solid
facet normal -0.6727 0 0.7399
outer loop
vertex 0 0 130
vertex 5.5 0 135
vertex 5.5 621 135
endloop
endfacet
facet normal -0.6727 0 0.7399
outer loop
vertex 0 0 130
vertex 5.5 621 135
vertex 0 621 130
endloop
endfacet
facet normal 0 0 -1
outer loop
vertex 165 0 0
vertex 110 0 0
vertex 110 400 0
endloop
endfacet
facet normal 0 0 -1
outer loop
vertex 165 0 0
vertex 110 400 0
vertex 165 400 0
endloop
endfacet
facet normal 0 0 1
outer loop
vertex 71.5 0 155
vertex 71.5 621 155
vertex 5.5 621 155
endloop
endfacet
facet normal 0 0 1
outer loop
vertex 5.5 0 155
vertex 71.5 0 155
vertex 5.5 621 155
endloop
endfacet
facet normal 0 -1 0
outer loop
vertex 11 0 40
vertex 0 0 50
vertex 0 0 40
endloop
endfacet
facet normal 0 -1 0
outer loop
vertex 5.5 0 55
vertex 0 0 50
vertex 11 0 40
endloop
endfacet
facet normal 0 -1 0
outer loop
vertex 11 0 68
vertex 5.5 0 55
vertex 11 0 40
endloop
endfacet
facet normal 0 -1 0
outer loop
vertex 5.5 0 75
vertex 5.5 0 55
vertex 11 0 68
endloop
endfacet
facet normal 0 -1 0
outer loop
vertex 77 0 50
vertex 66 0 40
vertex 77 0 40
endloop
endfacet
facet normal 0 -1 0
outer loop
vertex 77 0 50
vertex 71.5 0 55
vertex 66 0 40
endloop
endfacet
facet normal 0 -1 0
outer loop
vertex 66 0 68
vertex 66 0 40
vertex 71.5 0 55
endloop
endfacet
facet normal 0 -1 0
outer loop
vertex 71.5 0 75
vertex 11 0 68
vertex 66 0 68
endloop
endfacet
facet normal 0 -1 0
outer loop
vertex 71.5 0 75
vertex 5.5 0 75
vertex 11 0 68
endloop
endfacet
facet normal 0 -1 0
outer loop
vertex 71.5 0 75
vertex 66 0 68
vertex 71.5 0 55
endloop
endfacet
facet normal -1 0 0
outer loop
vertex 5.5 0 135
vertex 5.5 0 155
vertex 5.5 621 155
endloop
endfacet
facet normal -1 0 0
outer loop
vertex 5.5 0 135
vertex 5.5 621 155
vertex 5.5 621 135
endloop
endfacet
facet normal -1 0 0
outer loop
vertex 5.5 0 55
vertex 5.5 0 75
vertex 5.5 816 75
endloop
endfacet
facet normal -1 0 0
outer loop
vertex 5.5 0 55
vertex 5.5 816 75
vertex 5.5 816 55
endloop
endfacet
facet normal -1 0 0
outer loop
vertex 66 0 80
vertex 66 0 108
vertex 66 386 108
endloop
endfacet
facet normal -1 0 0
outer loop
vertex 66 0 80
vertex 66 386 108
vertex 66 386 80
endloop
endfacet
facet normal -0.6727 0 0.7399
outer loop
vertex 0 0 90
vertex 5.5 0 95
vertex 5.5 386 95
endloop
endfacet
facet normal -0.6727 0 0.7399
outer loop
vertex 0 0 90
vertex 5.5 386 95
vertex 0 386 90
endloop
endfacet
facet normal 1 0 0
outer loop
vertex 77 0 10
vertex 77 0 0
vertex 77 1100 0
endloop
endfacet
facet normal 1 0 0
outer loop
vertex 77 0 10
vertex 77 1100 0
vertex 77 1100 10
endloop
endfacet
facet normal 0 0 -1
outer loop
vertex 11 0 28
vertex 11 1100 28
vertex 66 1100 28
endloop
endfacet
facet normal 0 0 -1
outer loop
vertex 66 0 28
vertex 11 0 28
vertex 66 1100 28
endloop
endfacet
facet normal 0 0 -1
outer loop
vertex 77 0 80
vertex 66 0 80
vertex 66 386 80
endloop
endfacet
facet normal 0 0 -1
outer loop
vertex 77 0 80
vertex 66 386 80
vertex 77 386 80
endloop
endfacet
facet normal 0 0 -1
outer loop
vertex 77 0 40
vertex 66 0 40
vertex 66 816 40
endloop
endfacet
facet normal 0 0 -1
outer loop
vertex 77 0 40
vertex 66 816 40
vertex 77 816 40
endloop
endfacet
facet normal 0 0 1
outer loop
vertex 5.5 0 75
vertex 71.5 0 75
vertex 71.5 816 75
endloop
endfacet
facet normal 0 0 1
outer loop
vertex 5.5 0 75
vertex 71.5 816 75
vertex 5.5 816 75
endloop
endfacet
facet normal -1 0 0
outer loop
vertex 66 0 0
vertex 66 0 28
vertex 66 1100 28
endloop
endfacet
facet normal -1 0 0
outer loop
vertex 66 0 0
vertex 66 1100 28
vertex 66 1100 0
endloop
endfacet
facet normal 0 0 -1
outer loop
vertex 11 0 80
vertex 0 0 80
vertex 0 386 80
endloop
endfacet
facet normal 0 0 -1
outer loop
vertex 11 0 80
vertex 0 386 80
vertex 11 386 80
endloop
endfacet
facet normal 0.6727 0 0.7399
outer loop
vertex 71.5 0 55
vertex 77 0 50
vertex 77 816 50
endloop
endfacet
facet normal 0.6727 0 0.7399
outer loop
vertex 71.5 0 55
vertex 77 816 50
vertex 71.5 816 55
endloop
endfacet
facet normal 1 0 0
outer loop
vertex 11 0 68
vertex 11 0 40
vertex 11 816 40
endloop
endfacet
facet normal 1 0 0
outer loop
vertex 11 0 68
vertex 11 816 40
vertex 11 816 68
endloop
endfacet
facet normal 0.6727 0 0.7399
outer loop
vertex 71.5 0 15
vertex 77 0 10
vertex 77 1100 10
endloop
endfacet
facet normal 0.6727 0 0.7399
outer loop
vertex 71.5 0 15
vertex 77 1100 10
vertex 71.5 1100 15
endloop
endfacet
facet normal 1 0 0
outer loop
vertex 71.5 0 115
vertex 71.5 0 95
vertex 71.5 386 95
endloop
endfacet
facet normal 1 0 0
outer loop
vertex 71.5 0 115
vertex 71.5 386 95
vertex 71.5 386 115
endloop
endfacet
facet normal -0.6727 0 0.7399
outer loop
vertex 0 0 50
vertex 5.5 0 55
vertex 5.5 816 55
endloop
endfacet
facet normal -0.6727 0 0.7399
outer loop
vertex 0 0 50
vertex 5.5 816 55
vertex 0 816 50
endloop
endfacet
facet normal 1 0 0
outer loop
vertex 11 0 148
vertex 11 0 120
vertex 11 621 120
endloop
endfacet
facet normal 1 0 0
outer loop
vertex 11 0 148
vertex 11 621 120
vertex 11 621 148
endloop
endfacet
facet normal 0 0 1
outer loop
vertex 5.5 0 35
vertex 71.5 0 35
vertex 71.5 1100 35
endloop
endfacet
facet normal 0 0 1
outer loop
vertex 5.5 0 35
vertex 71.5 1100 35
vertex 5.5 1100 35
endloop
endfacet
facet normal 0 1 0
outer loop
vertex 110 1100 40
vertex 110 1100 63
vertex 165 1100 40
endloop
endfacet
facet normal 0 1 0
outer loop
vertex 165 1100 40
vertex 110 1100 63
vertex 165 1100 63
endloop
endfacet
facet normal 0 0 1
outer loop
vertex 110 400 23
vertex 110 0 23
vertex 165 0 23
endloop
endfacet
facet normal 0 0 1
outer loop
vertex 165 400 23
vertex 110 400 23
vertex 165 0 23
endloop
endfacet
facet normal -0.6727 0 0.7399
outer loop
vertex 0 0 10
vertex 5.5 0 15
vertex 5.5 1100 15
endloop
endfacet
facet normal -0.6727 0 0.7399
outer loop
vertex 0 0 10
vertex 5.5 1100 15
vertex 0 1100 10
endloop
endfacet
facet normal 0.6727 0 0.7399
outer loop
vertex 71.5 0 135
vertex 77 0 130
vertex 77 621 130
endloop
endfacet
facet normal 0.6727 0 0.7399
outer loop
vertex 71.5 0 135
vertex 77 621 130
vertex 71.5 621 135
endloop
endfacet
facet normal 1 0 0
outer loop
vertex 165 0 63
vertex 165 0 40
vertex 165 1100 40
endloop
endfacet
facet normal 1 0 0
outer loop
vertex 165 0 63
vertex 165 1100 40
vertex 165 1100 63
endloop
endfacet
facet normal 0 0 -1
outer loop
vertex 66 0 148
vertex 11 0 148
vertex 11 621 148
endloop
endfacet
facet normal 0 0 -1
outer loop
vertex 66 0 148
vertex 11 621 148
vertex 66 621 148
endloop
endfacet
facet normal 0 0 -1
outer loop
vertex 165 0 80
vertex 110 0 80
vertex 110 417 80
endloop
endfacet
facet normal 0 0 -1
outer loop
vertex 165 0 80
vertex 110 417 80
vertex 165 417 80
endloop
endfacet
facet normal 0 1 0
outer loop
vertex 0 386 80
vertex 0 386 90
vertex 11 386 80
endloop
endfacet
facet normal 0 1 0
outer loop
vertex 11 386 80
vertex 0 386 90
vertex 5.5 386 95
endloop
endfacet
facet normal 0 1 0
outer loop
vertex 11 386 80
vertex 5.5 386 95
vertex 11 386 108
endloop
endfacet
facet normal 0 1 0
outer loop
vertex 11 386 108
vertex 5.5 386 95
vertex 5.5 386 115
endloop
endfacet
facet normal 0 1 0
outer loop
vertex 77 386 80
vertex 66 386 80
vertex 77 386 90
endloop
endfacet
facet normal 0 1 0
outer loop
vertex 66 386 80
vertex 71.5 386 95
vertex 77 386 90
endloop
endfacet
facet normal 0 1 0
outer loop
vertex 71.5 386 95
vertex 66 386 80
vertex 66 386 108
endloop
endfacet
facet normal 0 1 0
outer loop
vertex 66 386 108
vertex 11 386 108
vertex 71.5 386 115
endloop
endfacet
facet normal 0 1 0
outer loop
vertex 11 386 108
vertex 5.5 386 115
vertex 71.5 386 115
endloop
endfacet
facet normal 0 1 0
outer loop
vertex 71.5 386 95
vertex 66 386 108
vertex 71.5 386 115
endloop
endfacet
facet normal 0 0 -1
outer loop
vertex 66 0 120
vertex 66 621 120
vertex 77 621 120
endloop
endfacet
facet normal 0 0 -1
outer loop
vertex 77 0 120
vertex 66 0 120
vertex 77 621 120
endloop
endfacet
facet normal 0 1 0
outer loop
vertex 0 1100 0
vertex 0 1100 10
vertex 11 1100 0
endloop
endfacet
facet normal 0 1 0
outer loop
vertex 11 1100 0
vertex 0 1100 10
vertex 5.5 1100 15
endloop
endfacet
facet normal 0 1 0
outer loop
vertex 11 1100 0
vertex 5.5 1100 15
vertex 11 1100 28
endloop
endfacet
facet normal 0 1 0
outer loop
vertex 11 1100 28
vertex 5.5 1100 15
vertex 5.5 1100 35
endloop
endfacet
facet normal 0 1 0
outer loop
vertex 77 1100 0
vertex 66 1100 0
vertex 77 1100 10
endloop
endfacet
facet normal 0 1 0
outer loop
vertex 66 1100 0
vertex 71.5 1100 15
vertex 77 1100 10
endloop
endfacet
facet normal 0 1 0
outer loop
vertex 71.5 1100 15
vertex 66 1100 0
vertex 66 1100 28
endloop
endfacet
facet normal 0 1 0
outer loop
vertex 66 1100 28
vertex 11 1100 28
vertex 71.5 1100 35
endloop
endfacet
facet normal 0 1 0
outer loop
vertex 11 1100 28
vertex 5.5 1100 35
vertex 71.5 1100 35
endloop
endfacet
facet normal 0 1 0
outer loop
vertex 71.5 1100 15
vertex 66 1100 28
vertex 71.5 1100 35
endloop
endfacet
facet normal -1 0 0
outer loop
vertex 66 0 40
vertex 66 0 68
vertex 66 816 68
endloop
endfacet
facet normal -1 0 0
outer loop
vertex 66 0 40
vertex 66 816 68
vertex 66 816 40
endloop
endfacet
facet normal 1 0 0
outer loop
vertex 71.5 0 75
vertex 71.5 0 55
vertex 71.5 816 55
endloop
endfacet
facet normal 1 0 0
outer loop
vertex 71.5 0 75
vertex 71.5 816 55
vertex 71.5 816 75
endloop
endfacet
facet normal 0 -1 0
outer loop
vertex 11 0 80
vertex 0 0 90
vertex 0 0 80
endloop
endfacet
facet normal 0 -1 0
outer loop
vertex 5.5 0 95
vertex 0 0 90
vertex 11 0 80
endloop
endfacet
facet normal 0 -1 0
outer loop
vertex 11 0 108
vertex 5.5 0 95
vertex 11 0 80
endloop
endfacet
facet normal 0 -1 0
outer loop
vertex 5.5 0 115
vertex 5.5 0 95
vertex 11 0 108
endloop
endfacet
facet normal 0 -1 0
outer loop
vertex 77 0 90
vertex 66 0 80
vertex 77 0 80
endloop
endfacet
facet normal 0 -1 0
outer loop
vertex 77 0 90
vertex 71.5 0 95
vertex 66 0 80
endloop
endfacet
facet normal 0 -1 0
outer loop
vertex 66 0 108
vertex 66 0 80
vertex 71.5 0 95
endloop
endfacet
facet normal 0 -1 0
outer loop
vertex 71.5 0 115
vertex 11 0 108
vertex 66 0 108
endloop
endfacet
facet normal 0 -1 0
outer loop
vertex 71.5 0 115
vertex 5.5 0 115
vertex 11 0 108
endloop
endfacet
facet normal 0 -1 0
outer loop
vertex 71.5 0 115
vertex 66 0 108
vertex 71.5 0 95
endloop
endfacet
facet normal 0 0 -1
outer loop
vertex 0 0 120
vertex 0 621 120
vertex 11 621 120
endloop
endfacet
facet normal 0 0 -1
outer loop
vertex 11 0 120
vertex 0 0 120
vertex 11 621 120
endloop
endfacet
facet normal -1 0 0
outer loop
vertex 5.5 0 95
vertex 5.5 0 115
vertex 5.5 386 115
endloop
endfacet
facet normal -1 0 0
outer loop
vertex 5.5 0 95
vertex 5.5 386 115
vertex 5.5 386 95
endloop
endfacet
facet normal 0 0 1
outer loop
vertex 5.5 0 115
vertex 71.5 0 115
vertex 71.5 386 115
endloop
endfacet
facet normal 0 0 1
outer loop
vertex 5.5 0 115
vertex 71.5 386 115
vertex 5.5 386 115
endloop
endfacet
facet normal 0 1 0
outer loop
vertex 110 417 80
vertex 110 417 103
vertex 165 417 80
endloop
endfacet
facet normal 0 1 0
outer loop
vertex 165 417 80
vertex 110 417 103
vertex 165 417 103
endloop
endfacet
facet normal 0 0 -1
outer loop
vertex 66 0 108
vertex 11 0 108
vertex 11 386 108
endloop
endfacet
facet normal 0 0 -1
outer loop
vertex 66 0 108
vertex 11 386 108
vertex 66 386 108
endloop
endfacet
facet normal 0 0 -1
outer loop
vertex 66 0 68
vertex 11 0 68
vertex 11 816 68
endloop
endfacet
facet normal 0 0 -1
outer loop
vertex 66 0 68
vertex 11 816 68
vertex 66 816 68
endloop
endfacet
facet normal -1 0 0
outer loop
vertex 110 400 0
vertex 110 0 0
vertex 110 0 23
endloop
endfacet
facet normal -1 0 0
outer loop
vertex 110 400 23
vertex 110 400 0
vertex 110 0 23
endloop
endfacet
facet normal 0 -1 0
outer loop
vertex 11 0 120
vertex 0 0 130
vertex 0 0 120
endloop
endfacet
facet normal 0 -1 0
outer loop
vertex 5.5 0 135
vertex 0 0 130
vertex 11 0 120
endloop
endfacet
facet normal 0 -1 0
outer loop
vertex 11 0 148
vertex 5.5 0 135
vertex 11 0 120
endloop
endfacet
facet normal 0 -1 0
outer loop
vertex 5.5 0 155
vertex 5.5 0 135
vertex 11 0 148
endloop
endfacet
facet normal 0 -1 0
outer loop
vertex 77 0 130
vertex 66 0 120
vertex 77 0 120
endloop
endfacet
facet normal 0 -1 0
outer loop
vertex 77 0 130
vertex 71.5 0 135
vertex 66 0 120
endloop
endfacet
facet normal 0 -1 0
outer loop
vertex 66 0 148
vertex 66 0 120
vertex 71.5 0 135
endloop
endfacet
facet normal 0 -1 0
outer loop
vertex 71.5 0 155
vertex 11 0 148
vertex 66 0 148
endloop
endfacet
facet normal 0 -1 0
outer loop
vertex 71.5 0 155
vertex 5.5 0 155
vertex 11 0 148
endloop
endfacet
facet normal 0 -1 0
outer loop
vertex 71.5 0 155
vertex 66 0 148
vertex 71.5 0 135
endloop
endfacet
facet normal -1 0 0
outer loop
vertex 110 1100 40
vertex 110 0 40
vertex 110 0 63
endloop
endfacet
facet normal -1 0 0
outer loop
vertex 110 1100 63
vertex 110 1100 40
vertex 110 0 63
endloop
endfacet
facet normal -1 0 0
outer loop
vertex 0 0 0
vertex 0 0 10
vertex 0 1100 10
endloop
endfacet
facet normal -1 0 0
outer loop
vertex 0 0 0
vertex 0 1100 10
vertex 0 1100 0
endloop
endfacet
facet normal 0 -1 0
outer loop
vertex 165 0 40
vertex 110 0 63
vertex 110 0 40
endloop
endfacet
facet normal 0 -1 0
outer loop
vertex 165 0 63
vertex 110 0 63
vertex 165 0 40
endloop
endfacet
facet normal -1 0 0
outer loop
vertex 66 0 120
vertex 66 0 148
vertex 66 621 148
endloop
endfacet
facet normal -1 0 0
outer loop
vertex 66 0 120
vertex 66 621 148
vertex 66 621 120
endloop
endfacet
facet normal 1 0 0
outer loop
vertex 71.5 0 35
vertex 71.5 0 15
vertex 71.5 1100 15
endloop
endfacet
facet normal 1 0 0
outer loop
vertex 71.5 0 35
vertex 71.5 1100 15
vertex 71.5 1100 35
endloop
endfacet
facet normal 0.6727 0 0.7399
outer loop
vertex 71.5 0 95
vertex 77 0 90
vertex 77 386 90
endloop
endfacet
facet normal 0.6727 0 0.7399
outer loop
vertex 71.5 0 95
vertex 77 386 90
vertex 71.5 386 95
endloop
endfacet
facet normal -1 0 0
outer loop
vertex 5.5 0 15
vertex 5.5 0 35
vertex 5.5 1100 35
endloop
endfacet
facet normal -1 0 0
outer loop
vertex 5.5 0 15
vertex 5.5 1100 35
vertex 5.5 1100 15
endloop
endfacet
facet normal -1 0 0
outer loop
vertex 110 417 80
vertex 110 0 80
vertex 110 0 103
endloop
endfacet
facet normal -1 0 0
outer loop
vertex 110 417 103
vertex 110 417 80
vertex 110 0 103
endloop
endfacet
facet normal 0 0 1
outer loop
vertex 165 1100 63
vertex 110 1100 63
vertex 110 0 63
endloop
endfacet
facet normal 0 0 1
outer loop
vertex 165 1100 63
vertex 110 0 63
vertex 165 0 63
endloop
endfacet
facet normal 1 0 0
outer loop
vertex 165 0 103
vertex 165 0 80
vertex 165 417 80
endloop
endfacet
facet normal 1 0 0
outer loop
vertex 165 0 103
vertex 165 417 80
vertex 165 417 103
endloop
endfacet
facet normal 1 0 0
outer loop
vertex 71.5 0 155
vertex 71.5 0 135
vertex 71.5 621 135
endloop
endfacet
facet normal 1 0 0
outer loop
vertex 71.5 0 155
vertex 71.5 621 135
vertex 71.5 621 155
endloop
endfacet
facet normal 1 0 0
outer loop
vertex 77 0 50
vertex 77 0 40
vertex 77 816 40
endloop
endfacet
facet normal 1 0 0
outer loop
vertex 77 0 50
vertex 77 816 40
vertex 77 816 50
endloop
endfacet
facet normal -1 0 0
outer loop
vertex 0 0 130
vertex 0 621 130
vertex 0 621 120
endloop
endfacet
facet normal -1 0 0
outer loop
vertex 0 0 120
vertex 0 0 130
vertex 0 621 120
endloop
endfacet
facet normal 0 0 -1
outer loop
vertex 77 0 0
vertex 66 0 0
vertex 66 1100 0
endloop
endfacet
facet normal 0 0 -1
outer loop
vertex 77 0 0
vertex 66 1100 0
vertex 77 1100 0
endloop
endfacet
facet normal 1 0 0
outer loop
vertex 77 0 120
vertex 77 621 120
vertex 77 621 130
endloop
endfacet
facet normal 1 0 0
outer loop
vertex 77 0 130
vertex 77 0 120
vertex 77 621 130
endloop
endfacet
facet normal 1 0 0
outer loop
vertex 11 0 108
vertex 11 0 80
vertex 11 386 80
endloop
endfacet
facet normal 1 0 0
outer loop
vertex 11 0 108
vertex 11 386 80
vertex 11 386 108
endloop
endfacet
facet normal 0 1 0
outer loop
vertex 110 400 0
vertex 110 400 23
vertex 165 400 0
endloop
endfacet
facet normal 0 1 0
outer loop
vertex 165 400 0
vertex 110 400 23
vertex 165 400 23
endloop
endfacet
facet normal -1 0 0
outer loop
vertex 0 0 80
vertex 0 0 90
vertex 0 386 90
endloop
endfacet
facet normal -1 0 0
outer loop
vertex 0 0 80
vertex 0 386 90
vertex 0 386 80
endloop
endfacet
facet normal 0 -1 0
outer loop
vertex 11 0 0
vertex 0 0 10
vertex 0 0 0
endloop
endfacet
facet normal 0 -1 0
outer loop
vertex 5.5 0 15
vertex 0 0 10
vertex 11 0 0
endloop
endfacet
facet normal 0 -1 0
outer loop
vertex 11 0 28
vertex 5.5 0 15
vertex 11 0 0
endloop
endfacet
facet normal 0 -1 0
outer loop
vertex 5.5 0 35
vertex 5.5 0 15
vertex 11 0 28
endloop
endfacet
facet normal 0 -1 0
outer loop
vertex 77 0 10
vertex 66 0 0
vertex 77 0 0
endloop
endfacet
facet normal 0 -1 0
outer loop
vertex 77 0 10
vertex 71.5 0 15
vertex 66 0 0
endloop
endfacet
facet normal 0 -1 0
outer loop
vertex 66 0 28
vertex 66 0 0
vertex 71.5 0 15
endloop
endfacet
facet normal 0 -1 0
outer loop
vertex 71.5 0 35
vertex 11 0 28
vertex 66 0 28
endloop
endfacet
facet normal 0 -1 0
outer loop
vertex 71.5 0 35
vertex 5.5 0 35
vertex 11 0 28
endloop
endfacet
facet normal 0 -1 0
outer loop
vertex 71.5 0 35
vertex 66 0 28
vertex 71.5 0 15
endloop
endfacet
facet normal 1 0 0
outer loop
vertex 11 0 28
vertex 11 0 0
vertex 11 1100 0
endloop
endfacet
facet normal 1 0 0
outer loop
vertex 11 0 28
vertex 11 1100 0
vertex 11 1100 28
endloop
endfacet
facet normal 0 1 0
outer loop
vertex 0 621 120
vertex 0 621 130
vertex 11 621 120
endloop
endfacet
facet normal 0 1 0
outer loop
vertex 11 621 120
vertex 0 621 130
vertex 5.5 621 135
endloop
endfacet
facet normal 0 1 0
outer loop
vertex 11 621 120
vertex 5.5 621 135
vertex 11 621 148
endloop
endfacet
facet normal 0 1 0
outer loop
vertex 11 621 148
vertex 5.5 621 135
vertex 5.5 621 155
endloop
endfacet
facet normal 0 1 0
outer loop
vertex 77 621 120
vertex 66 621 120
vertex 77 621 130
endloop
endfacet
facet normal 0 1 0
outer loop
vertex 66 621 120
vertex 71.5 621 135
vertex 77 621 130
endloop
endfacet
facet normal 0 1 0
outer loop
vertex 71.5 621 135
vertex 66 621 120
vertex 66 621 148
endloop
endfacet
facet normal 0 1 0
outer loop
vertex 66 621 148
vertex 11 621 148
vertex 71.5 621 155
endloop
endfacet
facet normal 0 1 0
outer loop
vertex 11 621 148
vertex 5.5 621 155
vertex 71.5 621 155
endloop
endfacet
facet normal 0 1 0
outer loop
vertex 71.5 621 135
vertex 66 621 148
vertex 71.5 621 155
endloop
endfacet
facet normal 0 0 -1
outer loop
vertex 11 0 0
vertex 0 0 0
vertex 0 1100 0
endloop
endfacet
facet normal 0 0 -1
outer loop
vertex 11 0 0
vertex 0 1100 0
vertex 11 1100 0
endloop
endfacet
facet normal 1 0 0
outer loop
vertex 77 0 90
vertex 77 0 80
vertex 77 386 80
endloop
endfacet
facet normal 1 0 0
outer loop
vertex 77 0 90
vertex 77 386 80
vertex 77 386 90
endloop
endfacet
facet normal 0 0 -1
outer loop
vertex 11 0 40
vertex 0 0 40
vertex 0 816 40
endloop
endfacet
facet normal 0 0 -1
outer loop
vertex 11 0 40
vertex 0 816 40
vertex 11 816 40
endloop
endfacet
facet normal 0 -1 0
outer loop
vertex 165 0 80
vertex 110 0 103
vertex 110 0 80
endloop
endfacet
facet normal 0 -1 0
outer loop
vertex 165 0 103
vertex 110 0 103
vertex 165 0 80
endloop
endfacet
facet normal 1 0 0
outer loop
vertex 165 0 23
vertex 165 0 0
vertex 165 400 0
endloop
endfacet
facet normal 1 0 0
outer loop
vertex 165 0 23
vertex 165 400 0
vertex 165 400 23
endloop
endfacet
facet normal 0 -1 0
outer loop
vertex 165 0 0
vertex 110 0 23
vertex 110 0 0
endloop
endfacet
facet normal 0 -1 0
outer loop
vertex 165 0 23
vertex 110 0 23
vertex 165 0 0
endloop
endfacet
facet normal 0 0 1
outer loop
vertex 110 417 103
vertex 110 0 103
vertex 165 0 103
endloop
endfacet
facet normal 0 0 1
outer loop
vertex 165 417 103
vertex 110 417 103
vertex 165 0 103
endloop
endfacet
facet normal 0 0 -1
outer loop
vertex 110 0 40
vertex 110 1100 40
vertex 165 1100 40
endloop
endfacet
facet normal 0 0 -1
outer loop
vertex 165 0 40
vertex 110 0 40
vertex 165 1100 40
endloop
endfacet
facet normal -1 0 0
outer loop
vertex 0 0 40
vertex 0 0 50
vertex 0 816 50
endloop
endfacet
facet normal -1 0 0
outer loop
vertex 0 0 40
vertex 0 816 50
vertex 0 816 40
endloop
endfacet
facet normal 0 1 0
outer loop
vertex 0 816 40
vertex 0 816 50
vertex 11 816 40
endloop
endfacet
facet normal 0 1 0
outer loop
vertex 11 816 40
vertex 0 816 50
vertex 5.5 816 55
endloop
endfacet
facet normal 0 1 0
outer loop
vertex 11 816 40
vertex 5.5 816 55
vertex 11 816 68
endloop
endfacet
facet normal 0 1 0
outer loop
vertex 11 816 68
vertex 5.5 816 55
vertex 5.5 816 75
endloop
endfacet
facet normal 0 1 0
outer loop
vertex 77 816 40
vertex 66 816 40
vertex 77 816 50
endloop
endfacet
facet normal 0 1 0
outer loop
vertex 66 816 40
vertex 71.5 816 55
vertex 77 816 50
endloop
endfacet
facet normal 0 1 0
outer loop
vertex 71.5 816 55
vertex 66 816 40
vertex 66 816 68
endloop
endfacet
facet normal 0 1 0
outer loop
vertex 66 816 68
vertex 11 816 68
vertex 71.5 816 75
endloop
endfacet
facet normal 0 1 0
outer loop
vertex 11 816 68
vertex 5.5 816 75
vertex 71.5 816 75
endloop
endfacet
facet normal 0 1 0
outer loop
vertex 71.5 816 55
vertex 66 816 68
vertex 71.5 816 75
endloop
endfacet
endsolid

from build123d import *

# Parameters (mm, degrees)
F1_DEPTH = 1100
F2_DEPTH = 816
F3_DEPTH = 386
F4_DEPTH = 621
F5_W     = 55
F5_H     = 23
F6_DEPTH = 400
F7_DEPTH = 1100
F8_DEPTH = 417


with BuildPart() as f1:
    # F0 (on Front) → F1 (new body)
    with BuildSketch(Plane.XZ):
        Polygon((0, 10), (0, 0), (11, 0), (11, 28), (66, 28), (66, 0), (77, 0), (77, 10), (71.5, 15), (71.5, 35), (5.5, 35), (5.5, 15), align=None)
    extrude(amount=-F1_DEPTH)


with BuildPart() as f2:
    # F0 (on Front) → F2 (new body)
    with BuildSketch(Plane.XZ):
        Polygon((0, 50), (0, 40), (11, 40), (11, 68), (66, 68), (66, 40), (77, 40), (77, 50), (71.5, 55), (71.5, 75), (5.5, 75), (5.5, 55), align=None)
    extrude(amount=-F2_DEPTH)


with BuildPart() as f3:
    # F0 (on Front) → F3 (new body)
    with BuildSketch(Plane.XZ):
        Polygon((0, 90), (0, 80), (11, 80), (11, 108), (66, 108), (66, 80), (77, 80), (77, 90), (71.5, 95), (71.5, 115), (5.5, 115), (5.5, 95), align=None)
    extrude(amount=-F3_DEPTH)


with BuildPart() as f4:
    # F0 (on Front) → F4 (new body)
    with BuildSketch(Plane.XZ):
        Polygon((0, 130), (0, 120), (11, 120), (11, 148), (66, 148), (66, 120), (77, 120), (77, 130), (71.5, 135), (71.5, 155), (5.5, 155), (5.5, 135), align=None)
    extrude(amount=-F4_DEPTH)


with BuildPart() as f6:
    # F5 (on Front) → F6 (new body)
    with BuildSketch(Plane.XZ):
        with Locations((137.5, 11.5)):
            Rectangle(F5_W, F5_H)
    extrude(amount=-F6_DEPTH)


with BuildPart() as f7:
    # F5 (on Front) → F7 (new body)
    with BuildSketch(Plane.XZ):
        with Locations((137.5, 51.5)):
            Rectangle(F5_W, F5_H)
    extrude(amount=-F7_DEPTH)


with BuildPart() as f8:
    # F5 (on Front) → F8 (new body)
    with BuildSketch(Plane.XZ):
        with Locations((137.5, 91.5)):
            Rectangle(F5_W, F5_H)
    extrude(amount=-F8_DEPTH)


solid = Compound([f1.part, f2.part, f3.part, f4.part, f6.part, f7.part, f8.part])
